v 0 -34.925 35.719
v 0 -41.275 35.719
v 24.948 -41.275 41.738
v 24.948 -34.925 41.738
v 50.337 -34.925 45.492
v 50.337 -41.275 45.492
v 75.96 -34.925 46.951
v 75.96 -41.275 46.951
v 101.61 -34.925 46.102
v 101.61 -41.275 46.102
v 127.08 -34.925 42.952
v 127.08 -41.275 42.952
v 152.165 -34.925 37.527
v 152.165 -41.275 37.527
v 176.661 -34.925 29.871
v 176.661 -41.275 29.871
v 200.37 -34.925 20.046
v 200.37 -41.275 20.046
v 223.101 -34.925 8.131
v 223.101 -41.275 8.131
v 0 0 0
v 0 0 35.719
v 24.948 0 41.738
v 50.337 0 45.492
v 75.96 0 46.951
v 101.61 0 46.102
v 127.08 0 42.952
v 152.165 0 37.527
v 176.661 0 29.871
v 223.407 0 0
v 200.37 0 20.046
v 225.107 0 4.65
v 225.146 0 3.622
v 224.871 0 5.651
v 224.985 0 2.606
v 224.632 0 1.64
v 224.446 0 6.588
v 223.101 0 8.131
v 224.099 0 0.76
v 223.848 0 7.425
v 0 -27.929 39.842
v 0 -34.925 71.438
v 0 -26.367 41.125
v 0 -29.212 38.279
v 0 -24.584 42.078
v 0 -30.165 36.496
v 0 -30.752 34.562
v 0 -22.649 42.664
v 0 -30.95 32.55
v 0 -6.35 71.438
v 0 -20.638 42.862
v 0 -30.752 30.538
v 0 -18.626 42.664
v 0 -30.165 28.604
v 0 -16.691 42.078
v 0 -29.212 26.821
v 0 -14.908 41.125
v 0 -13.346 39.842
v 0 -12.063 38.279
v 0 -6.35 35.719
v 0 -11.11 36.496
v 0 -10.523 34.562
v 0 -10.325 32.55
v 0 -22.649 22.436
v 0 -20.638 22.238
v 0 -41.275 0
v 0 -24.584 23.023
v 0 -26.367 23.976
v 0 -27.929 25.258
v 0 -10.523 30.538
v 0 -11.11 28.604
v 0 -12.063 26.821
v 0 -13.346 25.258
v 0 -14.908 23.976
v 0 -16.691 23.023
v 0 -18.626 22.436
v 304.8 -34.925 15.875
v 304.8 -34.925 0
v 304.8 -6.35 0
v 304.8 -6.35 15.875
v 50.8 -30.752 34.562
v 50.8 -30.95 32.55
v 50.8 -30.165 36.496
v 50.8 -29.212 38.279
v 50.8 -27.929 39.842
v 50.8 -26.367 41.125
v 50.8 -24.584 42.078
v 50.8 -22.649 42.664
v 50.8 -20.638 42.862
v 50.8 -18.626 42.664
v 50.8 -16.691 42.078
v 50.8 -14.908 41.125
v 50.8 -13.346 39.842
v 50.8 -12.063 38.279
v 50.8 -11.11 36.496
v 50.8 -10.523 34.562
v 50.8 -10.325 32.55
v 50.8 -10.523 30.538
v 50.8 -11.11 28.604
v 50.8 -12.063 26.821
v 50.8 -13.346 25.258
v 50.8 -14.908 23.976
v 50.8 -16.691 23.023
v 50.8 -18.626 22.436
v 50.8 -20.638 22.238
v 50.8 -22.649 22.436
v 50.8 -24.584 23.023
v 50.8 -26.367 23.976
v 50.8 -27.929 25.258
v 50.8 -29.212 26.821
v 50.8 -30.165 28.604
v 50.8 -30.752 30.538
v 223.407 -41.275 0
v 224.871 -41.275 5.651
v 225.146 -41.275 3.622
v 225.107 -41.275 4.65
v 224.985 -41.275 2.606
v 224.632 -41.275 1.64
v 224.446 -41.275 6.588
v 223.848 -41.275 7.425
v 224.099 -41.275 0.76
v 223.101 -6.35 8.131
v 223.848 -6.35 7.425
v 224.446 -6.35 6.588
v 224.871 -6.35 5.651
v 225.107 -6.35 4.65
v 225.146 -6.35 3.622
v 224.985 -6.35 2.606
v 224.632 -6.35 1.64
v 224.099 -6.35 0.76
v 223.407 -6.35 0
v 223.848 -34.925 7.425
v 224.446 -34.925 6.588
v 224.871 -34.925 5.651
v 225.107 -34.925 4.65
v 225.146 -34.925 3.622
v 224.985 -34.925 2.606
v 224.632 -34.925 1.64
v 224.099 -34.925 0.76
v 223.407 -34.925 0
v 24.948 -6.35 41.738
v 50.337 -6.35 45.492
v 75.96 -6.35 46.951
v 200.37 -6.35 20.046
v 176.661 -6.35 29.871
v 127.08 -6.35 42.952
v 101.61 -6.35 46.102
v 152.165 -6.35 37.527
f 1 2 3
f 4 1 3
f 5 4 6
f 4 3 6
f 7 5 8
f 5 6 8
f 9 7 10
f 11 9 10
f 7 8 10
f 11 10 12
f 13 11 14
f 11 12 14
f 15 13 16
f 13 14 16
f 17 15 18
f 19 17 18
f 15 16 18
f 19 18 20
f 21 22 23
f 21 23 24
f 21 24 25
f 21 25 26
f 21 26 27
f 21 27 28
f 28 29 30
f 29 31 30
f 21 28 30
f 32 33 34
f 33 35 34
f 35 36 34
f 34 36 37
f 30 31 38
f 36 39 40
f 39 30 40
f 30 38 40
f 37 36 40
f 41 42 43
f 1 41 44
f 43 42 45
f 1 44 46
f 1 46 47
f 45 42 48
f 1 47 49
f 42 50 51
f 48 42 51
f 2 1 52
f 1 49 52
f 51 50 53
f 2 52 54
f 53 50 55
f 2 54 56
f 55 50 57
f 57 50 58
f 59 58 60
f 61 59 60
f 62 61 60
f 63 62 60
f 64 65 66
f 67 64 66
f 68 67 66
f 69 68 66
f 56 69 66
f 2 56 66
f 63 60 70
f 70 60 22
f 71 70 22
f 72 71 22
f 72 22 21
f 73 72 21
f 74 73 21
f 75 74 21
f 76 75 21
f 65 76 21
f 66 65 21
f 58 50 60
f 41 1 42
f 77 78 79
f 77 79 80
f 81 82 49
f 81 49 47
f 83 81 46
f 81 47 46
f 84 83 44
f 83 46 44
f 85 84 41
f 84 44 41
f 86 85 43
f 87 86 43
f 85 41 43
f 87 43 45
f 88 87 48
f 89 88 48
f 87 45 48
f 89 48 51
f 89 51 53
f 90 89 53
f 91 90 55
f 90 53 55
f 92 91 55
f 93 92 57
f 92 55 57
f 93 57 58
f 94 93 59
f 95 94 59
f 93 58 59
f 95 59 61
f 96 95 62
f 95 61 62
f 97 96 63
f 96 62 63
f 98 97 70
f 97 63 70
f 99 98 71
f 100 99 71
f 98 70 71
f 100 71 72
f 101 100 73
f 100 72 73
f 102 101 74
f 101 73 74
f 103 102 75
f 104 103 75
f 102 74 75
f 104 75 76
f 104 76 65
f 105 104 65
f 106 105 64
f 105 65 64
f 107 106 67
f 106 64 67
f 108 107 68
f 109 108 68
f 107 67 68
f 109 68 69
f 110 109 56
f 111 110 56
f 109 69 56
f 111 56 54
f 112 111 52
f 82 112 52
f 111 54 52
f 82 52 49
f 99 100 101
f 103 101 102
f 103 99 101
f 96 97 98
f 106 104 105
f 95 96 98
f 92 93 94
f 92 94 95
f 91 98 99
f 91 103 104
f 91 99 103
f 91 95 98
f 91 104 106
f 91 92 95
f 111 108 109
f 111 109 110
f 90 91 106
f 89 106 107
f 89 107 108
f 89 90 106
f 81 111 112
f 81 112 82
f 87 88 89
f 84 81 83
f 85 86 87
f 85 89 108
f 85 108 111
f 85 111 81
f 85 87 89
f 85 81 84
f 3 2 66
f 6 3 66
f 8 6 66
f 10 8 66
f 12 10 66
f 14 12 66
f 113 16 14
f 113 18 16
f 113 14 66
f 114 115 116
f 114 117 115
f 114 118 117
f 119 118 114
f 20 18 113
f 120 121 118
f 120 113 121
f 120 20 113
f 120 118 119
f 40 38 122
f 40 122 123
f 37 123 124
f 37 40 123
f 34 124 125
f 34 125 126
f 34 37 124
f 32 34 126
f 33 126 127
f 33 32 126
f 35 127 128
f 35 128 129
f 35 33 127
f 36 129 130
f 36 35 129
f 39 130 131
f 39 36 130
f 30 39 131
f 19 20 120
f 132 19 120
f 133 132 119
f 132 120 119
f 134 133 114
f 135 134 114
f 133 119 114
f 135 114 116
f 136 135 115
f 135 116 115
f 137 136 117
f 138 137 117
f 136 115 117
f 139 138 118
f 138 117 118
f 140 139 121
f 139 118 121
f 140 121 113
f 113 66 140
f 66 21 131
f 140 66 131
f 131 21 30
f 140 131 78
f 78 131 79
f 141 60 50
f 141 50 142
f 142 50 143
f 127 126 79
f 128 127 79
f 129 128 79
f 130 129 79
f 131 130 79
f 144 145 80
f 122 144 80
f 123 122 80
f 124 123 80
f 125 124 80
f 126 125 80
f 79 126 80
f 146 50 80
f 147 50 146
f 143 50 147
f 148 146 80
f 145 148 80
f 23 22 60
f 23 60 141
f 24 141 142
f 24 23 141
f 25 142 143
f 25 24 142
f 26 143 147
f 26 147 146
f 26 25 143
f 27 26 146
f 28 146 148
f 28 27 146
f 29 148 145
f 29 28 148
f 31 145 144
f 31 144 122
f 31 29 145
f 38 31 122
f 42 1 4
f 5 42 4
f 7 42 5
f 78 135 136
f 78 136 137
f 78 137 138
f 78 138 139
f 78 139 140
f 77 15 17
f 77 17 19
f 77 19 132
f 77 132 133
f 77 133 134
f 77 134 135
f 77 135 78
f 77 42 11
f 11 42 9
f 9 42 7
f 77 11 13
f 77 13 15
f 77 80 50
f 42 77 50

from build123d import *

# Parameters (mm, degrees)
F1_DEPTH = 41.275
F2_R     = 10.3124
F3_DEPTH = 50.8
F5_DEPTH = 6.35


# Not quite as in the source:
# - a pattern or mirror of a feature is missing from the dataset's text; its kind, count and spacing are read off the source's solid


with BuildPart() as f1:
    # F0 (on Front) → F1 (new body)
    with BuildSketch(Plane.XZ):
        Polygon((0, 71.4375), (0, 0), (304.8, 0), (304.8, 15.875), align=None)
    extrude(amount=F1_DEPTH)

    # F2 (on face) → F3 (cut)
    with BuildSketch(Plane(origin=(0, 0, 0), x_dir=(0, -1, 0), z_dir=(-1, 0, 0))):
        with Locations((20.6375, 32.5501)):
            Circle(F2_R)
    extrude(amount=-F3_DEPTH, mode=Mode.SUBTRACT)

    # F4 (on face) → F5 (cut)
    with BuildSketch(Plane.XZ.offset(41.275)):
        with BuildLine():
            Line((0, 71.4375), (0, 35.71875))
            ThreePointArc((0, 35.71875), (114.380623494, 44.8132958518), (223.1006332012, 8.1309120088))
            ThreePointArc((223.1006332012, 8.1309120088), (225.1513542681, 4.1369059415), (223.4067767859, 0))
            Line((223.4067767859, 0), (304.8, 0))
            Line((304.8, 0), (304.8, 7.9375))
            Line((304.8, 7.9375), (304.8, 15.875))
            Line((304.8, 15.875), (0, 71.4375))
        make_face()
    f5 = extrude(amount=-F5_DEPTH, mode=Mode.SUBTRACT)

    # F5_copies: F5 across plane
    add(f5.mirror(Plane.ZX.offset(-20.6375)), mode=Mode.SUBTRACT)


solid = f1.part
